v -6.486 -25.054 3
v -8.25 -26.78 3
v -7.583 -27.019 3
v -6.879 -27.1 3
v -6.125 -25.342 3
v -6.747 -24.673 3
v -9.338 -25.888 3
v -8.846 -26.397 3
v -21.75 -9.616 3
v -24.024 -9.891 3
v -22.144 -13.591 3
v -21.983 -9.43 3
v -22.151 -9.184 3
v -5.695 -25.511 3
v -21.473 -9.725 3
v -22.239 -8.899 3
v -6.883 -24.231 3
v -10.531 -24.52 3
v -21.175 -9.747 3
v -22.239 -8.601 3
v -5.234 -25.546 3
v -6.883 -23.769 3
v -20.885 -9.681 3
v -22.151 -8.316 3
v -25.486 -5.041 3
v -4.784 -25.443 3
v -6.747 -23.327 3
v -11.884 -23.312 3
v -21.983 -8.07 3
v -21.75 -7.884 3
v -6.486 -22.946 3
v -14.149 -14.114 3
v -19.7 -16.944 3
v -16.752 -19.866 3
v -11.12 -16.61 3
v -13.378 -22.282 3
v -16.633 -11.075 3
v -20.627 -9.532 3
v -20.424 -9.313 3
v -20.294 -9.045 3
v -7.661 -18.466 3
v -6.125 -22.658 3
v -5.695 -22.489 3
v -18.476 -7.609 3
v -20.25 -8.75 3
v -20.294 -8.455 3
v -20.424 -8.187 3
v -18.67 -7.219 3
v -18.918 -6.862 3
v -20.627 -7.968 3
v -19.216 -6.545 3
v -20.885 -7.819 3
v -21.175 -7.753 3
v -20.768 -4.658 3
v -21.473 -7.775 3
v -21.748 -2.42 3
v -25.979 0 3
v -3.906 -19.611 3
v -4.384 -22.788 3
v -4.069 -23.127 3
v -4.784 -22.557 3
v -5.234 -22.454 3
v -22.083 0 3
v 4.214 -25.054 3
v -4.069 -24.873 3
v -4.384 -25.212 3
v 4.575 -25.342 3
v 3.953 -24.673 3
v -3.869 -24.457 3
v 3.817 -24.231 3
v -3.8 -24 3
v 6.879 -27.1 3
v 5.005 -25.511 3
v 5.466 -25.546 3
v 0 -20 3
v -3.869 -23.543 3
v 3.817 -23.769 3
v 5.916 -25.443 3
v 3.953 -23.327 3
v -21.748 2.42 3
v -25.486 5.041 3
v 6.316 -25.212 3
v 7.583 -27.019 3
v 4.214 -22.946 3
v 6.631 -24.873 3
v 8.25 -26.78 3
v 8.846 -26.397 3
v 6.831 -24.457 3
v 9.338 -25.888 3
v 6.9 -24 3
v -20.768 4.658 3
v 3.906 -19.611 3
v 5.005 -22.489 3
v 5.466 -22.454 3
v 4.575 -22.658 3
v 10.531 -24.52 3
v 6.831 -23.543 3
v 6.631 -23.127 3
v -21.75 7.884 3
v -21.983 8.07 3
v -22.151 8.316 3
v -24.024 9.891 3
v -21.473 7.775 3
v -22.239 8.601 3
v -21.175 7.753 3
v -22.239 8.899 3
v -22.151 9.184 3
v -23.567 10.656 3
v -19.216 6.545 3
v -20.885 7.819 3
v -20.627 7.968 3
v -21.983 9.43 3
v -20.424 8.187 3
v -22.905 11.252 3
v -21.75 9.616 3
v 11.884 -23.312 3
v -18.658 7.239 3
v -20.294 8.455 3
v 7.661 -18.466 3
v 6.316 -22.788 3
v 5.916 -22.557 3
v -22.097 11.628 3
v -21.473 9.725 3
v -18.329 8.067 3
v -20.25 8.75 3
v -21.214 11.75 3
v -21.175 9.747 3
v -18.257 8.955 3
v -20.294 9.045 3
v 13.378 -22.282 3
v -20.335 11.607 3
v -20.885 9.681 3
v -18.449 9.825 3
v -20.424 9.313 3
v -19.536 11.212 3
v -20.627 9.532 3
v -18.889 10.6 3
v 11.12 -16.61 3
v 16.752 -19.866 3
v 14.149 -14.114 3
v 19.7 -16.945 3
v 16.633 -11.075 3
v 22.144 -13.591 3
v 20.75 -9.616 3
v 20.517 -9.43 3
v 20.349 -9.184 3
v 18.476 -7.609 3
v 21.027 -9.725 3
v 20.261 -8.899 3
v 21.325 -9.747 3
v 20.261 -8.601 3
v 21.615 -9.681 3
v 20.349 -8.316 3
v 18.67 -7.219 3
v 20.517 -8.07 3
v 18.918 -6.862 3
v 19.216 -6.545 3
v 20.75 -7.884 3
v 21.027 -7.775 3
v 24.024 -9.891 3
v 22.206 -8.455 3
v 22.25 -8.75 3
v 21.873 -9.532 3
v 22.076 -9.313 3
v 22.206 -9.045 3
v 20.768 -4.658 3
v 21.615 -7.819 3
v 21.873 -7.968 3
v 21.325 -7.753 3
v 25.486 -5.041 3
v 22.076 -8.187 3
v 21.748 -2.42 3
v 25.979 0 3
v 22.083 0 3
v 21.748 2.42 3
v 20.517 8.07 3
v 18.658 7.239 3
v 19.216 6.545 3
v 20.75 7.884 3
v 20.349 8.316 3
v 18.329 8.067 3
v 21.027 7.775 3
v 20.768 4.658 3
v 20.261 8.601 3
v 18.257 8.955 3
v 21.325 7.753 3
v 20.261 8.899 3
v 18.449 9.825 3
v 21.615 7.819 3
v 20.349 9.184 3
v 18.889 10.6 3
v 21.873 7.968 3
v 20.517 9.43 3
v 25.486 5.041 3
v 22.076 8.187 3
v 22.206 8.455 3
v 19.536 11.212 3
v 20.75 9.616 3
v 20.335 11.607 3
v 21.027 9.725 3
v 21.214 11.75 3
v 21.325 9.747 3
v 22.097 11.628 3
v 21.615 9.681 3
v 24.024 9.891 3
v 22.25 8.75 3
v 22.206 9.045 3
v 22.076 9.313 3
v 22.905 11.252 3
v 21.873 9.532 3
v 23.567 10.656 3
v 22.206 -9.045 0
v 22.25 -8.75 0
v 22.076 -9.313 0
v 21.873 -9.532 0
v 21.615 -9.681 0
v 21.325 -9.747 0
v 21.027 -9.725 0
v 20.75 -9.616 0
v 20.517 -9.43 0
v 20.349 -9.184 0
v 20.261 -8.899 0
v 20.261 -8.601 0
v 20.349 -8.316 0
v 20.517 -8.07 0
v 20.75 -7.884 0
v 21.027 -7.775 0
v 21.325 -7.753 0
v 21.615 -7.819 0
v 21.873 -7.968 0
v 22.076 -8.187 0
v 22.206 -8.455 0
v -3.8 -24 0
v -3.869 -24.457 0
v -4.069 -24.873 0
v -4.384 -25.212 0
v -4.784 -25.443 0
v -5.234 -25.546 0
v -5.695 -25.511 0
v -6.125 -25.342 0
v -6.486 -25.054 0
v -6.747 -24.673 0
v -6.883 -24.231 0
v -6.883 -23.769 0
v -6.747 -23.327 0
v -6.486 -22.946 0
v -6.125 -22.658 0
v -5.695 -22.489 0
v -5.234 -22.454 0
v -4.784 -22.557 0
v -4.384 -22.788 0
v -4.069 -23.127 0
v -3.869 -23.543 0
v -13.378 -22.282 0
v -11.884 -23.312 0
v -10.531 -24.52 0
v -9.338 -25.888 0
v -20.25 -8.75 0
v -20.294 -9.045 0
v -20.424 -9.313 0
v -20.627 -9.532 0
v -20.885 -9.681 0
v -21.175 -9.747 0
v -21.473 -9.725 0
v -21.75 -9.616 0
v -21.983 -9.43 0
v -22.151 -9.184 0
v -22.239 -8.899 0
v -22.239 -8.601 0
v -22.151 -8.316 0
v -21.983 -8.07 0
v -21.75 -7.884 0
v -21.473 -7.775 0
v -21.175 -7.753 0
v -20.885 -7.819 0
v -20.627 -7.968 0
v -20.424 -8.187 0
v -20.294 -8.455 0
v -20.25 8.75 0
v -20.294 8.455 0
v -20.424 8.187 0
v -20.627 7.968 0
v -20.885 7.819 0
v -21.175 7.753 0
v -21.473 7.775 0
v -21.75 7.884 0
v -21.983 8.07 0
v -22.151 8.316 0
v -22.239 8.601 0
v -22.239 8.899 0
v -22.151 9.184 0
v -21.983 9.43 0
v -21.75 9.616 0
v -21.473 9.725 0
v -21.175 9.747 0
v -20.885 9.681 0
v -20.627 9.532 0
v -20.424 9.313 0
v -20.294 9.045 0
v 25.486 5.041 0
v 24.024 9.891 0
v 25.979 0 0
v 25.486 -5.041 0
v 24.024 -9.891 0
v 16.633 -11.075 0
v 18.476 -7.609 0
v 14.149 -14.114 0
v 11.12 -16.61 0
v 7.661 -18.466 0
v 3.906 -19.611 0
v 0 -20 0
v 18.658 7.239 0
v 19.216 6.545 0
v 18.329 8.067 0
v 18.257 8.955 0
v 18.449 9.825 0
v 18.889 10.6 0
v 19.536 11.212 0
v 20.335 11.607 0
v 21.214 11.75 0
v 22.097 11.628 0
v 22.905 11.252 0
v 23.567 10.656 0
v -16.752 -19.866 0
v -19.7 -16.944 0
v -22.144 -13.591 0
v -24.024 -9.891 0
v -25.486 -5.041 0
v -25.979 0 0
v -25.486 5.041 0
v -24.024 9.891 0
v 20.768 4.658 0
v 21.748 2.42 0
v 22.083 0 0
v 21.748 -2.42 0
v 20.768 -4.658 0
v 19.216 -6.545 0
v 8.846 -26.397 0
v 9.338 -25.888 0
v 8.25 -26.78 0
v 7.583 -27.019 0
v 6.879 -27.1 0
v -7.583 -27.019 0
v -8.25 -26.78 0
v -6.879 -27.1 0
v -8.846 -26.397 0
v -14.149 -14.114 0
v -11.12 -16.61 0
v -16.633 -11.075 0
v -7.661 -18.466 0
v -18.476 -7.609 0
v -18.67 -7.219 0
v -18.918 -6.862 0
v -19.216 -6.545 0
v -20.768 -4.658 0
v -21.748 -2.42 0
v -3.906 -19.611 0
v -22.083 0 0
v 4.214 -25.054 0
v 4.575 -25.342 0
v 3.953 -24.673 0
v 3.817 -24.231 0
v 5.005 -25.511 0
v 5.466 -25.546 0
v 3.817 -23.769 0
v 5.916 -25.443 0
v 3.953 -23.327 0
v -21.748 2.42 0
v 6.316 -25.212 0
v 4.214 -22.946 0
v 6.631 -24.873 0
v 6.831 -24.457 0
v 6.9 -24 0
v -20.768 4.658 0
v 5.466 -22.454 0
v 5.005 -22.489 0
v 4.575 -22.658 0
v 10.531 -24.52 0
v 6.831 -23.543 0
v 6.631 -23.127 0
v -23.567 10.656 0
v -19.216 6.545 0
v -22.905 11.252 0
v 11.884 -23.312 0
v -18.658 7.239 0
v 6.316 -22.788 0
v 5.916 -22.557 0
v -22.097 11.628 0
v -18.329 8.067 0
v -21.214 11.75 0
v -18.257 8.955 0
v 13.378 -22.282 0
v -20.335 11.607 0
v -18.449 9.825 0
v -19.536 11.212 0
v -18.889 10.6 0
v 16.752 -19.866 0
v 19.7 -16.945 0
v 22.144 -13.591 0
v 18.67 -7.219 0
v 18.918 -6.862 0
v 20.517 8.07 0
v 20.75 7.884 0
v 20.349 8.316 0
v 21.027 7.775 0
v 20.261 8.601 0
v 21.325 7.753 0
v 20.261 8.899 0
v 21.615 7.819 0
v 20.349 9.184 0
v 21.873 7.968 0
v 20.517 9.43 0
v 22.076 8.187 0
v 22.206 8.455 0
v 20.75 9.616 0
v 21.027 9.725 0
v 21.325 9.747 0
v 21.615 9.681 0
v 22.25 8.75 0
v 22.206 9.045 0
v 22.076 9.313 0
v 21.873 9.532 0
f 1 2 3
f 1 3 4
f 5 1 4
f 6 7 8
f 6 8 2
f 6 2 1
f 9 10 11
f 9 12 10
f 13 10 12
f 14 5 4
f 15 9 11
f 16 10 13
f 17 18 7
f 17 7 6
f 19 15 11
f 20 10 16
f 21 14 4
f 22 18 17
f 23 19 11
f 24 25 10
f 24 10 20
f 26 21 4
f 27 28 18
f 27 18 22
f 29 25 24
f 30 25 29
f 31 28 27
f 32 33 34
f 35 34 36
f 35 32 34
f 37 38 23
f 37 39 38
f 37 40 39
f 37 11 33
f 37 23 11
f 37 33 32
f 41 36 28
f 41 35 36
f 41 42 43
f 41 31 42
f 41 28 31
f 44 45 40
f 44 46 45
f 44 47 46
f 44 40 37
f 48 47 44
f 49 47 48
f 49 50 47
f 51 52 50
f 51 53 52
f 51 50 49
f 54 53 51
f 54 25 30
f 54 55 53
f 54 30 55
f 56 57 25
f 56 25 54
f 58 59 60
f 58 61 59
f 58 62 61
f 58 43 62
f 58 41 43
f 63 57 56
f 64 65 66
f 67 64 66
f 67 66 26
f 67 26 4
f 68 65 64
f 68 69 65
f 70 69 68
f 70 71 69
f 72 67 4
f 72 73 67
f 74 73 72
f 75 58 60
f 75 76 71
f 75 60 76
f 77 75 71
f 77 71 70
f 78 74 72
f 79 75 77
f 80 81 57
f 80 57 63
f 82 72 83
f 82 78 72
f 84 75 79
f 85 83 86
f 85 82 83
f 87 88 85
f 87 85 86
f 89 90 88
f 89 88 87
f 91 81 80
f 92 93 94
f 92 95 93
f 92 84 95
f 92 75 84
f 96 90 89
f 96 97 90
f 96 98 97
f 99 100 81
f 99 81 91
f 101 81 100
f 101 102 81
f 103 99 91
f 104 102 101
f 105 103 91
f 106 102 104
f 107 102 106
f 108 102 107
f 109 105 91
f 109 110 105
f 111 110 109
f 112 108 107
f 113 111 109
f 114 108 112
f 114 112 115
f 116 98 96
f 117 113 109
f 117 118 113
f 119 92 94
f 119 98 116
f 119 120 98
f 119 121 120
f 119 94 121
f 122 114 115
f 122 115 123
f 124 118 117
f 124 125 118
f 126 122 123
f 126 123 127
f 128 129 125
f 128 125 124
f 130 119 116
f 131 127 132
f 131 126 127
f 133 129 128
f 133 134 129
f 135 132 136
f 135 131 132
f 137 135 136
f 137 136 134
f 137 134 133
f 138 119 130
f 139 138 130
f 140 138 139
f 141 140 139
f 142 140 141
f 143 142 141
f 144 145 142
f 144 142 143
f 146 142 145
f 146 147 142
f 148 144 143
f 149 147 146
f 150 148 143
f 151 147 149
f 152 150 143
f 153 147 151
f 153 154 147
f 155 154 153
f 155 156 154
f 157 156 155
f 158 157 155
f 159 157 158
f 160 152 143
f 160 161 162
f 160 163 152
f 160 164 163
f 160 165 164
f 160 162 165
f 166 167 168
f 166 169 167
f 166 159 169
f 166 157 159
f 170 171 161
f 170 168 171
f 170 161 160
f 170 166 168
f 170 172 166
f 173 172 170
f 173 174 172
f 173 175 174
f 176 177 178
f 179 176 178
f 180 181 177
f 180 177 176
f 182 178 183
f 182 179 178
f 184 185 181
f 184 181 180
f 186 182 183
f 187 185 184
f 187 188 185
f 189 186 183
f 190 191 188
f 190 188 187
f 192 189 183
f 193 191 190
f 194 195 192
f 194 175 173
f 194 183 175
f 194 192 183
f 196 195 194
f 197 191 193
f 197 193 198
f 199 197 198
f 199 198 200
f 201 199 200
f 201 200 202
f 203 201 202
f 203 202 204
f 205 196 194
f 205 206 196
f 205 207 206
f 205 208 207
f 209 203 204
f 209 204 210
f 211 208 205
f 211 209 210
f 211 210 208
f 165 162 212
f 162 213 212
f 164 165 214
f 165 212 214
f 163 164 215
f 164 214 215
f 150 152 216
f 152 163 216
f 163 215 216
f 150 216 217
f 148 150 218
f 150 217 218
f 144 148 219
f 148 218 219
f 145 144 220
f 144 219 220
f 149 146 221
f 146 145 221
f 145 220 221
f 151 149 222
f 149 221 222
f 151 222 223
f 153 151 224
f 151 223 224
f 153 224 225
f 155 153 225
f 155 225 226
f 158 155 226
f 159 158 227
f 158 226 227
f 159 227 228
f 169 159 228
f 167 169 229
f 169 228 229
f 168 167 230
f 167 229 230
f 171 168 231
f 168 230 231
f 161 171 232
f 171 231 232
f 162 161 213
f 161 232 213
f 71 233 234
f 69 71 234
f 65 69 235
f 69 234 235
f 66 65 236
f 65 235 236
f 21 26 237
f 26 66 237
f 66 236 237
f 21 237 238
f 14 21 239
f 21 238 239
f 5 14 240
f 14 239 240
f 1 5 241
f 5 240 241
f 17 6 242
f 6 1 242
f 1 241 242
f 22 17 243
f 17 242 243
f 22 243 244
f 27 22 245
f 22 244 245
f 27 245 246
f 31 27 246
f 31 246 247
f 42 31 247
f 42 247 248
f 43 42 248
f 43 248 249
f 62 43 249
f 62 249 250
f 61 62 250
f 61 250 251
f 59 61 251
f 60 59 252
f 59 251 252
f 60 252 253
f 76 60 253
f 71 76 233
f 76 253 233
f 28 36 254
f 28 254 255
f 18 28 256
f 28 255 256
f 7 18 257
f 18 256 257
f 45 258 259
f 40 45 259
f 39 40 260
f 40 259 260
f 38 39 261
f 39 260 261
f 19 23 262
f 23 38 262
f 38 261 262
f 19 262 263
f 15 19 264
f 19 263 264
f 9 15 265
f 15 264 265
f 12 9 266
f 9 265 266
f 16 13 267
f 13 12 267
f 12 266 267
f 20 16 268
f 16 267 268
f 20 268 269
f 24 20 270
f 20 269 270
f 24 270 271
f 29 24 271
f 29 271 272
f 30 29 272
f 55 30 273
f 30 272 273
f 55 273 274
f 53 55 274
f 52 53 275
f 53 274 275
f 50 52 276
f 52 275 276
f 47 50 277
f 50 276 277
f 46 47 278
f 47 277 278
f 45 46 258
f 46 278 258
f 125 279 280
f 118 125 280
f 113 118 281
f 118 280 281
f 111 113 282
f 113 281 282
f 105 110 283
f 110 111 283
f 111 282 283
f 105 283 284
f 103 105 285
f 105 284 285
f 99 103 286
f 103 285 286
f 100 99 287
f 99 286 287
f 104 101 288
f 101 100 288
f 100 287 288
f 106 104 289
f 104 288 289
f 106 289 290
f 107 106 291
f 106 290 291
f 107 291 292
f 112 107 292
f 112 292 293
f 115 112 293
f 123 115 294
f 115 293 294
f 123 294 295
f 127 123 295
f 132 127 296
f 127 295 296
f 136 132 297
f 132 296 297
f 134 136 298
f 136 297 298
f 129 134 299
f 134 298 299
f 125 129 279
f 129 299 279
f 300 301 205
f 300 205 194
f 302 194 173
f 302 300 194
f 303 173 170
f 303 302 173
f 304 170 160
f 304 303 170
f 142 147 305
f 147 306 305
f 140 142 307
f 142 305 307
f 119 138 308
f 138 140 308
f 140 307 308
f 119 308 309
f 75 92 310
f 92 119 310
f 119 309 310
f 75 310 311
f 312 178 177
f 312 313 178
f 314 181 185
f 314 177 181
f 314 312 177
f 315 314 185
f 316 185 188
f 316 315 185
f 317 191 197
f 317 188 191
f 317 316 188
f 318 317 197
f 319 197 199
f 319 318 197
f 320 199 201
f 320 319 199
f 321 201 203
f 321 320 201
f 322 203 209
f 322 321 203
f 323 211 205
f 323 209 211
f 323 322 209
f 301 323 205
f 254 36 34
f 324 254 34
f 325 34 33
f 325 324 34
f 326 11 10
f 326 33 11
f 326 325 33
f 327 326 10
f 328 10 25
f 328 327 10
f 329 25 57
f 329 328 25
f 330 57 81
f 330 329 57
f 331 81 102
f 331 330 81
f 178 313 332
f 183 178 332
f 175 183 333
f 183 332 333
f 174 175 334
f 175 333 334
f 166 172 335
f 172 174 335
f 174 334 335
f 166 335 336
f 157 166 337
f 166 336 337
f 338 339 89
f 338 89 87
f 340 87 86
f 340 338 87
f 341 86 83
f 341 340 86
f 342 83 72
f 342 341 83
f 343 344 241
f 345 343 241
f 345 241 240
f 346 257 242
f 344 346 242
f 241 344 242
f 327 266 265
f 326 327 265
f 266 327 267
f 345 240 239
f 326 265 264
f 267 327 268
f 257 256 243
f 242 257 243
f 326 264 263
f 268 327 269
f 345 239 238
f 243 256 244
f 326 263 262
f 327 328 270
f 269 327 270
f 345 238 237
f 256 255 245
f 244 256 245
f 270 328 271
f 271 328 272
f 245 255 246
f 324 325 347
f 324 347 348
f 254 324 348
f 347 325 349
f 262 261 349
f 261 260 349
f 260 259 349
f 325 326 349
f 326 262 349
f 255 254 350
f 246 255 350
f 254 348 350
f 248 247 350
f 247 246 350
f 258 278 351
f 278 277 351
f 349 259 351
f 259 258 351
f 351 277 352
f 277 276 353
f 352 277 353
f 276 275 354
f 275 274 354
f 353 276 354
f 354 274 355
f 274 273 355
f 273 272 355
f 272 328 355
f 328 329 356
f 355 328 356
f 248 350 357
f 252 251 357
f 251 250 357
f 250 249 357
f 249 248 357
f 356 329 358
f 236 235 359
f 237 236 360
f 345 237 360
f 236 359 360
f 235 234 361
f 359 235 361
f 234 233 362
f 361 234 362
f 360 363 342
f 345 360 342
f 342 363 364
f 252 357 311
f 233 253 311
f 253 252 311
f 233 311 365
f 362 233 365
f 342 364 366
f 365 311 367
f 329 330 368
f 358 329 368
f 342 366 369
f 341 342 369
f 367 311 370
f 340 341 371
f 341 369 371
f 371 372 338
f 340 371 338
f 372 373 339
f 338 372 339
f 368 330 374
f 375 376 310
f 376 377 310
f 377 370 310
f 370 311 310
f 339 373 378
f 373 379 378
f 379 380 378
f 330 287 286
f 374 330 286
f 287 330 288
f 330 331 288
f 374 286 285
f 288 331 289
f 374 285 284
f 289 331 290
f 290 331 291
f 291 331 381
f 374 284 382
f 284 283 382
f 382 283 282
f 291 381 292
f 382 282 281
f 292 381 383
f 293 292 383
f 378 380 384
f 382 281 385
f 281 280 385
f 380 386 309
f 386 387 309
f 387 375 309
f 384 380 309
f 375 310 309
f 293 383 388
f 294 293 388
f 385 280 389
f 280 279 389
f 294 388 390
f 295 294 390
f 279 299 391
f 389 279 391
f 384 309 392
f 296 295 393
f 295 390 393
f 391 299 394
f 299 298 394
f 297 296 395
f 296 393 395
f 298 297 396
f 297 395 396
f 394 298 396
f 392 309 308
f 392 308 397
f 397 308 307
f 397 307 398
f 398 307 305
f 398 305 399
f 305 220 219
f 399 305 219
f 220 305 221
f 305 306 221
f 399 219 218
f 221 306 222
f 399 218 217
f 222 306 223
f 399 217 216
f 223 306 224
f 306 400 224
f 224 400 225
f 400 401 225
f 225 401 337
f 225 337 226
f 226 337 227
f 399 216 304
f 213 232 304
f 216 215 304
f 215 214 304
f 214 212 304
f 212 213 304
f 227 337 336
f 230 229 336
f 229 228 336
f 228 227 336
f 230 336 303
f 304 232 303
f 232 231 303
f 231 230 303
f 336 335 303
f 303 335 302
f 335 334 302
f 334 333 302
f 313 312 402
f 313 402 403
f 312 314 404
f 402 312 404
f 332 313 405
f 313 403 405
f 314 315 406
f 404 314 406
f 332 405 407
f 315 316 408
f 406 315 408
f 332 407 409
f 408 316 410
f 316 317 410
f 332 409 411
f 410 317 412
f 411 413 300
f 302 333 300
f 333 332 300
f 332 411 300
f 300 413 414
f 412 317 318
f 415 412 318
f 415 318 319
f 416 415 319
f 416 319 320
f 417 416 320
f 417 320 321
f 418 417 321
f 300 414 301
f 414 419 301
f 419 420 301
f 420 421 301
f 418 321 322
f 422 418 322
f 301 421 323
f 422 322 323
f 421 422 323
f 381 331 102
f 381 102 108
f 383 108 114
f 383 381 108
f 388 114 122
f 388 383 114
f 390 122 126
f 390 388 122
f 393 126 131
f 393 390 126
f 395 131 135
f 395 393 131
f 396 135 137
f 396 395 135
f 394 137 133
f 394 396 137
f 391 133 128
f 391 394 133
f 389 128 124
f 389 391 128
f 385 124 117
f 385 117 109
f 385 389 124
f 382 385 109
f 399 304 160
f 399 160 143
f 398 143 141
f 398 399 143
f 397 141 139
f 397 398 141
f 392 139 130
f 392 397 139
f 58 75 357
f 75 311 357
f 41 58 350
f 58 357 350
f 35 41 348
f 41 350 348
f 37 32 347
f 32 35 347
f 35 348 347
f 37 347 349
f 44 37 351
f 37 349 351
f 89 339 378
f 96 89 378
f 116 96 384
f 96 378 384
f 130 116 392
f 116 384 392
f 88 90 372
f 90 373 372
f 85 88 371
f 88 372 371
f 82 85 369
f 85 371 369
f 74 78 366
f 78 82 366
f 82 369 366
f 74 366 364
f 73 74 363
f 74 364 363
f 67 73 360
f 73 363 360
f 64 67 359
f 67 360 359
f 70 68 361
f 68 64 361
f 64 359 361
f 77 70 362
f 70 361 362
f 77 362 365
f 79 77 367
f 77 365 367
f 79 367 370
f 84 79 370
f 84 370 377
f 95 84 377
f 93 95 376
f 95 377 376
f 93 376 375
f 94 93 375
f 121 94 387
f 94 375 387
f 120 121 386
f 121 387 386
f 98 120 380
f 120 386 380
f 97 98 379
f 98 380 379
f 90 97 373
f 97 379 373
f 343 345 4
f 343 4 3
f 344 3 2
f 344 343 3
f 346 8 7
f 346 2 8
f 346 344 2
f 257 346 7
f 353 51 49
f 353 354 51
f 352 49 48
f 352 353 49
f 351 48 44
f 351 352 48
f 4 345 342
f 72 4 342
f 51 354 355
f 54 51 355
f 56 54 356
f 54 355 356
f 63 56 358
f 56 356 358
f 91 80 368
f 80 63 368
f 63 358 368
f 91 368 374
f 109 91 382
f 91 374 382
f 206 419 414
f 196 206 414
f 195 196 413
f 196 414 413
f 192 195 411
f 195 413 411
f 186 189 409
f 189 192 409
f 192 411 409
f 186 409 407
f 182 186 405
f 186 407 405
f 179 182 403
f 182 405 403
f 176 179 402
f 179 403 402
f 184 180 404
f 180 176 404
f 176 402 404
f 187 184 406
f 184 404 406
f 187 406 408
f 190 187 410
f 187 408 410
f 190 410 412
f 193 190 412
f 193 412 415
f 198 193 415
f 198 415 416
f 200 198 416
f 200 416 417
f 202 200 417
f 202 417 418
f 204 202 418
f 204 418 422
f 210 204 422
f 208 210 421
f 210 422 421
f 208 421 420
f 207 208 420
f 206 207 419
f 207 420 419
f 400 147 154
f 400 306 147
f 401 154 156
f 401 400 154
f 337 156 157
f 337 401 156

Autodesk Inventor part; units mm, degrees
ref_plane "YZ Plane" through (0, 0, 0) normal (1, 0, 0) x (0, 1, 0)
ref_plane "XZ Plane" through (0, 0, 0) normal (0, 1, 0) x (-1, 0, 0)
ref_plane "XY Plane" through (0, 0, 0) normal (0, 0, 1) x (1, 0, 0)
ref_plane "Work Plane1" through (0, 0, 0) normal (0, 0, 1) x (1, 0, 0)
sketch "Sketch1" plane through (0, 0, 0) normal (0, 0, 1) x (1, 0, 0)
  line L0 (22.5, 10) -> (22.5, -10) construction
  line L1 (-22.5, 10) -> (22.5, 10) construction
  line L2 (-22.5, -10) -> (-22.5, 10) construction
  line L3 (22.5, -10) -> (-22.5, -10) construction
  circle A0 centre (-13.1, -5.1) radius 0.75 construction
  circle A1 centre (-13.1, 5.1) radius 0.75 construction
  circle A2 centre (-2.44, 7) radius 0.5 construction
  circle A3 centre (-3.81, -8) radius 0.5 construction
  circle A4 centre (-1.27, -8) radius 0.5 construction
  circle A5 centre (1.27, -8) radius 0.5 construction
  circle A6 centre (-21.25, -8.75) radius 0.8 projected
  circle A7 centre (21.25, -8.75) radius 0.8 projected
  circle A8 centre (-21.25, 8.75) radius 0.8 projected
  circle A9 centre (21.25, 8.75) radius 0.8 projected
  circle A10 centre (3.81, -8) radius 0.5 construction
  circle A11 centre (2.44, 7) radius 0.5 construction
  circle A12 centre (13.1, 5.1) radius 0.75 construction
  circle A13 centre (13.1, -5.1) radius 0.75 construction
  circle A14 centre (-13.1789, 0.0006) radius 7.9502 construction
  circle A15 centre (13.1, 0) radius 7.9502 construction
  circle A16 centre (-21.25, 8.75) radius 3
  circle A17 centre (-21.25, -8.75) radius 3
  arc A18 (-19.216, 6.5448) -> (-19.216, -6.5448) centre (-13.1795, 0) ccw
  arc A19 (-24.0244, 9.8913) -> (-24.0244, -9.8913) centre (0.0206, 0) ccw
  line L4 (0, 10) -> (0, -10) construction
  line L5 (-6.9, -24) -> (6.9, -24) construction
  line L6 (-5.35, -25.55) -> (5.35, -25.55) construction
  line L7 (5.35, -22.45) -> (-5.35, -22.45) construction
  arc A20 (-5.35, -22.45) -> (-5.35, -25.55) centre (-5.35, -24) ccw construction
  arc A21 (5.35, -25.55) -> (5.35, -22.45) centre (5.35, -24) ccw construction
  arc A22 (-24.0244, -9.8913) -> (-13.3779, -22.2819) centre (0.0206, 0) ccw
  line L8 (-9.9794, -24) -> (9.9794, -24) construction
  line L9 (-6.8794, -27.1) -> (6.8794, -27.1)
  line L10 (6.8794, -20.9) -> (-6.8794, -20.9) construction
  arc A23 (-9.3384, -25.8877) -> (-6.8794, -27.1) centre (-6.8794, -24) ccw
  arc A24 (6.8794, -27.1) -> (6.8794, -20.9) centre (6.8794, -24) ccw construction
  circle A25 centre (-5.35, -24) radius 1.55
  circle A26 centre (5.35, -24) radius 1.55
  arc A27 (-18.4756, -7.6087) -> (0, -20) centre (0.0206, 0) ccw
  arc A28 (-9.3384, -25.8877) -> (-13.3779, -22.2819) centre (-20.8684, -34.7387) ccw
  line L11 (6.8794, -27.1) -> (-6.8794, -27.1)
  circle A29 centre (-21.25, 8.75) radius 1
  circle A30 centre (-21.25, -8.75) radius 1
  circle A31 centre (21.25, 8.75) radius 3
  circle A32 centre (21.25, -8.75) radius 3
  arc A33 (19.216, -6.5448) -> (19.216, 6.5448) centre (13.1795, 0) ccw
  arc A34 (24.0244, -9.8913) -> (24.0244, 9.8913) centre (-0.0206, 0) ccw
  arc A35 (13.3779, -22.2819) -> (24.0244, -9.8913) centre (-0.0206, 0) ccw
  arc A36 (6.8794, -27.1) -> (9.3384, -25.8877) centre (6.8794, -24) ccw
  arc A37 (0, -20) -> (18.4756, -7.6087) centre (-0.0206, 0) ccw
  arc A38 (13.3779, -22.2819) -> (9.3384, -25.8877) centre (20.8684, -34.7387) ccw
  circle A39 centre (21.25, 8.75) radius 1
  circle A40 centre (21.25, -8.75) radius 1
  point P0 (0, 0)
  point P1 (0, -24)
  point P2 (0, 0)
  point P3 (0, -24)
  point P4 (-8.2502, -26.7804)
  point P5 (22.095, 8.2152)
  point P6 (22.095, 9.2848)
  point P7 (22.095, -9.2848)
  point P8 (22.095, -8.2152)
  dimension "d0" = 6
  dimension "d11" = 17.5
  dimension "d16" = 15.9004
  dimension "d17" = 8.9036
  dimension "d19" = 8.9036
  dimension "d21" = 13.8
  dimension "d22" = 3.1
  dimension "d24" = 9.9794
  dimension "d25" = 19.9588
  dimension "d26" = 6.2
  dimension "d29" = 14.5355
  dimension "d32" = 24
  dimension "d33" = 26
  dimension "d34" = 0.2
  dimension "d37" = 0.2
extrude "Extrusion1" add sketch "Sketch1" along normal blind 3 contours A16 | A16 A18 A17 A19 | A17 | A17 A27 A37 A32 A35 A38 A36 L9 A23 A28 A22 | A32 | A33 A31 A34 A32 | A31
equation "\"d17\" = d19"
equation "\"d25\" = 2 * d24"
equation "\"d26\" = 2 * d22"
properties part number "mount" material "ABS Plastic"
